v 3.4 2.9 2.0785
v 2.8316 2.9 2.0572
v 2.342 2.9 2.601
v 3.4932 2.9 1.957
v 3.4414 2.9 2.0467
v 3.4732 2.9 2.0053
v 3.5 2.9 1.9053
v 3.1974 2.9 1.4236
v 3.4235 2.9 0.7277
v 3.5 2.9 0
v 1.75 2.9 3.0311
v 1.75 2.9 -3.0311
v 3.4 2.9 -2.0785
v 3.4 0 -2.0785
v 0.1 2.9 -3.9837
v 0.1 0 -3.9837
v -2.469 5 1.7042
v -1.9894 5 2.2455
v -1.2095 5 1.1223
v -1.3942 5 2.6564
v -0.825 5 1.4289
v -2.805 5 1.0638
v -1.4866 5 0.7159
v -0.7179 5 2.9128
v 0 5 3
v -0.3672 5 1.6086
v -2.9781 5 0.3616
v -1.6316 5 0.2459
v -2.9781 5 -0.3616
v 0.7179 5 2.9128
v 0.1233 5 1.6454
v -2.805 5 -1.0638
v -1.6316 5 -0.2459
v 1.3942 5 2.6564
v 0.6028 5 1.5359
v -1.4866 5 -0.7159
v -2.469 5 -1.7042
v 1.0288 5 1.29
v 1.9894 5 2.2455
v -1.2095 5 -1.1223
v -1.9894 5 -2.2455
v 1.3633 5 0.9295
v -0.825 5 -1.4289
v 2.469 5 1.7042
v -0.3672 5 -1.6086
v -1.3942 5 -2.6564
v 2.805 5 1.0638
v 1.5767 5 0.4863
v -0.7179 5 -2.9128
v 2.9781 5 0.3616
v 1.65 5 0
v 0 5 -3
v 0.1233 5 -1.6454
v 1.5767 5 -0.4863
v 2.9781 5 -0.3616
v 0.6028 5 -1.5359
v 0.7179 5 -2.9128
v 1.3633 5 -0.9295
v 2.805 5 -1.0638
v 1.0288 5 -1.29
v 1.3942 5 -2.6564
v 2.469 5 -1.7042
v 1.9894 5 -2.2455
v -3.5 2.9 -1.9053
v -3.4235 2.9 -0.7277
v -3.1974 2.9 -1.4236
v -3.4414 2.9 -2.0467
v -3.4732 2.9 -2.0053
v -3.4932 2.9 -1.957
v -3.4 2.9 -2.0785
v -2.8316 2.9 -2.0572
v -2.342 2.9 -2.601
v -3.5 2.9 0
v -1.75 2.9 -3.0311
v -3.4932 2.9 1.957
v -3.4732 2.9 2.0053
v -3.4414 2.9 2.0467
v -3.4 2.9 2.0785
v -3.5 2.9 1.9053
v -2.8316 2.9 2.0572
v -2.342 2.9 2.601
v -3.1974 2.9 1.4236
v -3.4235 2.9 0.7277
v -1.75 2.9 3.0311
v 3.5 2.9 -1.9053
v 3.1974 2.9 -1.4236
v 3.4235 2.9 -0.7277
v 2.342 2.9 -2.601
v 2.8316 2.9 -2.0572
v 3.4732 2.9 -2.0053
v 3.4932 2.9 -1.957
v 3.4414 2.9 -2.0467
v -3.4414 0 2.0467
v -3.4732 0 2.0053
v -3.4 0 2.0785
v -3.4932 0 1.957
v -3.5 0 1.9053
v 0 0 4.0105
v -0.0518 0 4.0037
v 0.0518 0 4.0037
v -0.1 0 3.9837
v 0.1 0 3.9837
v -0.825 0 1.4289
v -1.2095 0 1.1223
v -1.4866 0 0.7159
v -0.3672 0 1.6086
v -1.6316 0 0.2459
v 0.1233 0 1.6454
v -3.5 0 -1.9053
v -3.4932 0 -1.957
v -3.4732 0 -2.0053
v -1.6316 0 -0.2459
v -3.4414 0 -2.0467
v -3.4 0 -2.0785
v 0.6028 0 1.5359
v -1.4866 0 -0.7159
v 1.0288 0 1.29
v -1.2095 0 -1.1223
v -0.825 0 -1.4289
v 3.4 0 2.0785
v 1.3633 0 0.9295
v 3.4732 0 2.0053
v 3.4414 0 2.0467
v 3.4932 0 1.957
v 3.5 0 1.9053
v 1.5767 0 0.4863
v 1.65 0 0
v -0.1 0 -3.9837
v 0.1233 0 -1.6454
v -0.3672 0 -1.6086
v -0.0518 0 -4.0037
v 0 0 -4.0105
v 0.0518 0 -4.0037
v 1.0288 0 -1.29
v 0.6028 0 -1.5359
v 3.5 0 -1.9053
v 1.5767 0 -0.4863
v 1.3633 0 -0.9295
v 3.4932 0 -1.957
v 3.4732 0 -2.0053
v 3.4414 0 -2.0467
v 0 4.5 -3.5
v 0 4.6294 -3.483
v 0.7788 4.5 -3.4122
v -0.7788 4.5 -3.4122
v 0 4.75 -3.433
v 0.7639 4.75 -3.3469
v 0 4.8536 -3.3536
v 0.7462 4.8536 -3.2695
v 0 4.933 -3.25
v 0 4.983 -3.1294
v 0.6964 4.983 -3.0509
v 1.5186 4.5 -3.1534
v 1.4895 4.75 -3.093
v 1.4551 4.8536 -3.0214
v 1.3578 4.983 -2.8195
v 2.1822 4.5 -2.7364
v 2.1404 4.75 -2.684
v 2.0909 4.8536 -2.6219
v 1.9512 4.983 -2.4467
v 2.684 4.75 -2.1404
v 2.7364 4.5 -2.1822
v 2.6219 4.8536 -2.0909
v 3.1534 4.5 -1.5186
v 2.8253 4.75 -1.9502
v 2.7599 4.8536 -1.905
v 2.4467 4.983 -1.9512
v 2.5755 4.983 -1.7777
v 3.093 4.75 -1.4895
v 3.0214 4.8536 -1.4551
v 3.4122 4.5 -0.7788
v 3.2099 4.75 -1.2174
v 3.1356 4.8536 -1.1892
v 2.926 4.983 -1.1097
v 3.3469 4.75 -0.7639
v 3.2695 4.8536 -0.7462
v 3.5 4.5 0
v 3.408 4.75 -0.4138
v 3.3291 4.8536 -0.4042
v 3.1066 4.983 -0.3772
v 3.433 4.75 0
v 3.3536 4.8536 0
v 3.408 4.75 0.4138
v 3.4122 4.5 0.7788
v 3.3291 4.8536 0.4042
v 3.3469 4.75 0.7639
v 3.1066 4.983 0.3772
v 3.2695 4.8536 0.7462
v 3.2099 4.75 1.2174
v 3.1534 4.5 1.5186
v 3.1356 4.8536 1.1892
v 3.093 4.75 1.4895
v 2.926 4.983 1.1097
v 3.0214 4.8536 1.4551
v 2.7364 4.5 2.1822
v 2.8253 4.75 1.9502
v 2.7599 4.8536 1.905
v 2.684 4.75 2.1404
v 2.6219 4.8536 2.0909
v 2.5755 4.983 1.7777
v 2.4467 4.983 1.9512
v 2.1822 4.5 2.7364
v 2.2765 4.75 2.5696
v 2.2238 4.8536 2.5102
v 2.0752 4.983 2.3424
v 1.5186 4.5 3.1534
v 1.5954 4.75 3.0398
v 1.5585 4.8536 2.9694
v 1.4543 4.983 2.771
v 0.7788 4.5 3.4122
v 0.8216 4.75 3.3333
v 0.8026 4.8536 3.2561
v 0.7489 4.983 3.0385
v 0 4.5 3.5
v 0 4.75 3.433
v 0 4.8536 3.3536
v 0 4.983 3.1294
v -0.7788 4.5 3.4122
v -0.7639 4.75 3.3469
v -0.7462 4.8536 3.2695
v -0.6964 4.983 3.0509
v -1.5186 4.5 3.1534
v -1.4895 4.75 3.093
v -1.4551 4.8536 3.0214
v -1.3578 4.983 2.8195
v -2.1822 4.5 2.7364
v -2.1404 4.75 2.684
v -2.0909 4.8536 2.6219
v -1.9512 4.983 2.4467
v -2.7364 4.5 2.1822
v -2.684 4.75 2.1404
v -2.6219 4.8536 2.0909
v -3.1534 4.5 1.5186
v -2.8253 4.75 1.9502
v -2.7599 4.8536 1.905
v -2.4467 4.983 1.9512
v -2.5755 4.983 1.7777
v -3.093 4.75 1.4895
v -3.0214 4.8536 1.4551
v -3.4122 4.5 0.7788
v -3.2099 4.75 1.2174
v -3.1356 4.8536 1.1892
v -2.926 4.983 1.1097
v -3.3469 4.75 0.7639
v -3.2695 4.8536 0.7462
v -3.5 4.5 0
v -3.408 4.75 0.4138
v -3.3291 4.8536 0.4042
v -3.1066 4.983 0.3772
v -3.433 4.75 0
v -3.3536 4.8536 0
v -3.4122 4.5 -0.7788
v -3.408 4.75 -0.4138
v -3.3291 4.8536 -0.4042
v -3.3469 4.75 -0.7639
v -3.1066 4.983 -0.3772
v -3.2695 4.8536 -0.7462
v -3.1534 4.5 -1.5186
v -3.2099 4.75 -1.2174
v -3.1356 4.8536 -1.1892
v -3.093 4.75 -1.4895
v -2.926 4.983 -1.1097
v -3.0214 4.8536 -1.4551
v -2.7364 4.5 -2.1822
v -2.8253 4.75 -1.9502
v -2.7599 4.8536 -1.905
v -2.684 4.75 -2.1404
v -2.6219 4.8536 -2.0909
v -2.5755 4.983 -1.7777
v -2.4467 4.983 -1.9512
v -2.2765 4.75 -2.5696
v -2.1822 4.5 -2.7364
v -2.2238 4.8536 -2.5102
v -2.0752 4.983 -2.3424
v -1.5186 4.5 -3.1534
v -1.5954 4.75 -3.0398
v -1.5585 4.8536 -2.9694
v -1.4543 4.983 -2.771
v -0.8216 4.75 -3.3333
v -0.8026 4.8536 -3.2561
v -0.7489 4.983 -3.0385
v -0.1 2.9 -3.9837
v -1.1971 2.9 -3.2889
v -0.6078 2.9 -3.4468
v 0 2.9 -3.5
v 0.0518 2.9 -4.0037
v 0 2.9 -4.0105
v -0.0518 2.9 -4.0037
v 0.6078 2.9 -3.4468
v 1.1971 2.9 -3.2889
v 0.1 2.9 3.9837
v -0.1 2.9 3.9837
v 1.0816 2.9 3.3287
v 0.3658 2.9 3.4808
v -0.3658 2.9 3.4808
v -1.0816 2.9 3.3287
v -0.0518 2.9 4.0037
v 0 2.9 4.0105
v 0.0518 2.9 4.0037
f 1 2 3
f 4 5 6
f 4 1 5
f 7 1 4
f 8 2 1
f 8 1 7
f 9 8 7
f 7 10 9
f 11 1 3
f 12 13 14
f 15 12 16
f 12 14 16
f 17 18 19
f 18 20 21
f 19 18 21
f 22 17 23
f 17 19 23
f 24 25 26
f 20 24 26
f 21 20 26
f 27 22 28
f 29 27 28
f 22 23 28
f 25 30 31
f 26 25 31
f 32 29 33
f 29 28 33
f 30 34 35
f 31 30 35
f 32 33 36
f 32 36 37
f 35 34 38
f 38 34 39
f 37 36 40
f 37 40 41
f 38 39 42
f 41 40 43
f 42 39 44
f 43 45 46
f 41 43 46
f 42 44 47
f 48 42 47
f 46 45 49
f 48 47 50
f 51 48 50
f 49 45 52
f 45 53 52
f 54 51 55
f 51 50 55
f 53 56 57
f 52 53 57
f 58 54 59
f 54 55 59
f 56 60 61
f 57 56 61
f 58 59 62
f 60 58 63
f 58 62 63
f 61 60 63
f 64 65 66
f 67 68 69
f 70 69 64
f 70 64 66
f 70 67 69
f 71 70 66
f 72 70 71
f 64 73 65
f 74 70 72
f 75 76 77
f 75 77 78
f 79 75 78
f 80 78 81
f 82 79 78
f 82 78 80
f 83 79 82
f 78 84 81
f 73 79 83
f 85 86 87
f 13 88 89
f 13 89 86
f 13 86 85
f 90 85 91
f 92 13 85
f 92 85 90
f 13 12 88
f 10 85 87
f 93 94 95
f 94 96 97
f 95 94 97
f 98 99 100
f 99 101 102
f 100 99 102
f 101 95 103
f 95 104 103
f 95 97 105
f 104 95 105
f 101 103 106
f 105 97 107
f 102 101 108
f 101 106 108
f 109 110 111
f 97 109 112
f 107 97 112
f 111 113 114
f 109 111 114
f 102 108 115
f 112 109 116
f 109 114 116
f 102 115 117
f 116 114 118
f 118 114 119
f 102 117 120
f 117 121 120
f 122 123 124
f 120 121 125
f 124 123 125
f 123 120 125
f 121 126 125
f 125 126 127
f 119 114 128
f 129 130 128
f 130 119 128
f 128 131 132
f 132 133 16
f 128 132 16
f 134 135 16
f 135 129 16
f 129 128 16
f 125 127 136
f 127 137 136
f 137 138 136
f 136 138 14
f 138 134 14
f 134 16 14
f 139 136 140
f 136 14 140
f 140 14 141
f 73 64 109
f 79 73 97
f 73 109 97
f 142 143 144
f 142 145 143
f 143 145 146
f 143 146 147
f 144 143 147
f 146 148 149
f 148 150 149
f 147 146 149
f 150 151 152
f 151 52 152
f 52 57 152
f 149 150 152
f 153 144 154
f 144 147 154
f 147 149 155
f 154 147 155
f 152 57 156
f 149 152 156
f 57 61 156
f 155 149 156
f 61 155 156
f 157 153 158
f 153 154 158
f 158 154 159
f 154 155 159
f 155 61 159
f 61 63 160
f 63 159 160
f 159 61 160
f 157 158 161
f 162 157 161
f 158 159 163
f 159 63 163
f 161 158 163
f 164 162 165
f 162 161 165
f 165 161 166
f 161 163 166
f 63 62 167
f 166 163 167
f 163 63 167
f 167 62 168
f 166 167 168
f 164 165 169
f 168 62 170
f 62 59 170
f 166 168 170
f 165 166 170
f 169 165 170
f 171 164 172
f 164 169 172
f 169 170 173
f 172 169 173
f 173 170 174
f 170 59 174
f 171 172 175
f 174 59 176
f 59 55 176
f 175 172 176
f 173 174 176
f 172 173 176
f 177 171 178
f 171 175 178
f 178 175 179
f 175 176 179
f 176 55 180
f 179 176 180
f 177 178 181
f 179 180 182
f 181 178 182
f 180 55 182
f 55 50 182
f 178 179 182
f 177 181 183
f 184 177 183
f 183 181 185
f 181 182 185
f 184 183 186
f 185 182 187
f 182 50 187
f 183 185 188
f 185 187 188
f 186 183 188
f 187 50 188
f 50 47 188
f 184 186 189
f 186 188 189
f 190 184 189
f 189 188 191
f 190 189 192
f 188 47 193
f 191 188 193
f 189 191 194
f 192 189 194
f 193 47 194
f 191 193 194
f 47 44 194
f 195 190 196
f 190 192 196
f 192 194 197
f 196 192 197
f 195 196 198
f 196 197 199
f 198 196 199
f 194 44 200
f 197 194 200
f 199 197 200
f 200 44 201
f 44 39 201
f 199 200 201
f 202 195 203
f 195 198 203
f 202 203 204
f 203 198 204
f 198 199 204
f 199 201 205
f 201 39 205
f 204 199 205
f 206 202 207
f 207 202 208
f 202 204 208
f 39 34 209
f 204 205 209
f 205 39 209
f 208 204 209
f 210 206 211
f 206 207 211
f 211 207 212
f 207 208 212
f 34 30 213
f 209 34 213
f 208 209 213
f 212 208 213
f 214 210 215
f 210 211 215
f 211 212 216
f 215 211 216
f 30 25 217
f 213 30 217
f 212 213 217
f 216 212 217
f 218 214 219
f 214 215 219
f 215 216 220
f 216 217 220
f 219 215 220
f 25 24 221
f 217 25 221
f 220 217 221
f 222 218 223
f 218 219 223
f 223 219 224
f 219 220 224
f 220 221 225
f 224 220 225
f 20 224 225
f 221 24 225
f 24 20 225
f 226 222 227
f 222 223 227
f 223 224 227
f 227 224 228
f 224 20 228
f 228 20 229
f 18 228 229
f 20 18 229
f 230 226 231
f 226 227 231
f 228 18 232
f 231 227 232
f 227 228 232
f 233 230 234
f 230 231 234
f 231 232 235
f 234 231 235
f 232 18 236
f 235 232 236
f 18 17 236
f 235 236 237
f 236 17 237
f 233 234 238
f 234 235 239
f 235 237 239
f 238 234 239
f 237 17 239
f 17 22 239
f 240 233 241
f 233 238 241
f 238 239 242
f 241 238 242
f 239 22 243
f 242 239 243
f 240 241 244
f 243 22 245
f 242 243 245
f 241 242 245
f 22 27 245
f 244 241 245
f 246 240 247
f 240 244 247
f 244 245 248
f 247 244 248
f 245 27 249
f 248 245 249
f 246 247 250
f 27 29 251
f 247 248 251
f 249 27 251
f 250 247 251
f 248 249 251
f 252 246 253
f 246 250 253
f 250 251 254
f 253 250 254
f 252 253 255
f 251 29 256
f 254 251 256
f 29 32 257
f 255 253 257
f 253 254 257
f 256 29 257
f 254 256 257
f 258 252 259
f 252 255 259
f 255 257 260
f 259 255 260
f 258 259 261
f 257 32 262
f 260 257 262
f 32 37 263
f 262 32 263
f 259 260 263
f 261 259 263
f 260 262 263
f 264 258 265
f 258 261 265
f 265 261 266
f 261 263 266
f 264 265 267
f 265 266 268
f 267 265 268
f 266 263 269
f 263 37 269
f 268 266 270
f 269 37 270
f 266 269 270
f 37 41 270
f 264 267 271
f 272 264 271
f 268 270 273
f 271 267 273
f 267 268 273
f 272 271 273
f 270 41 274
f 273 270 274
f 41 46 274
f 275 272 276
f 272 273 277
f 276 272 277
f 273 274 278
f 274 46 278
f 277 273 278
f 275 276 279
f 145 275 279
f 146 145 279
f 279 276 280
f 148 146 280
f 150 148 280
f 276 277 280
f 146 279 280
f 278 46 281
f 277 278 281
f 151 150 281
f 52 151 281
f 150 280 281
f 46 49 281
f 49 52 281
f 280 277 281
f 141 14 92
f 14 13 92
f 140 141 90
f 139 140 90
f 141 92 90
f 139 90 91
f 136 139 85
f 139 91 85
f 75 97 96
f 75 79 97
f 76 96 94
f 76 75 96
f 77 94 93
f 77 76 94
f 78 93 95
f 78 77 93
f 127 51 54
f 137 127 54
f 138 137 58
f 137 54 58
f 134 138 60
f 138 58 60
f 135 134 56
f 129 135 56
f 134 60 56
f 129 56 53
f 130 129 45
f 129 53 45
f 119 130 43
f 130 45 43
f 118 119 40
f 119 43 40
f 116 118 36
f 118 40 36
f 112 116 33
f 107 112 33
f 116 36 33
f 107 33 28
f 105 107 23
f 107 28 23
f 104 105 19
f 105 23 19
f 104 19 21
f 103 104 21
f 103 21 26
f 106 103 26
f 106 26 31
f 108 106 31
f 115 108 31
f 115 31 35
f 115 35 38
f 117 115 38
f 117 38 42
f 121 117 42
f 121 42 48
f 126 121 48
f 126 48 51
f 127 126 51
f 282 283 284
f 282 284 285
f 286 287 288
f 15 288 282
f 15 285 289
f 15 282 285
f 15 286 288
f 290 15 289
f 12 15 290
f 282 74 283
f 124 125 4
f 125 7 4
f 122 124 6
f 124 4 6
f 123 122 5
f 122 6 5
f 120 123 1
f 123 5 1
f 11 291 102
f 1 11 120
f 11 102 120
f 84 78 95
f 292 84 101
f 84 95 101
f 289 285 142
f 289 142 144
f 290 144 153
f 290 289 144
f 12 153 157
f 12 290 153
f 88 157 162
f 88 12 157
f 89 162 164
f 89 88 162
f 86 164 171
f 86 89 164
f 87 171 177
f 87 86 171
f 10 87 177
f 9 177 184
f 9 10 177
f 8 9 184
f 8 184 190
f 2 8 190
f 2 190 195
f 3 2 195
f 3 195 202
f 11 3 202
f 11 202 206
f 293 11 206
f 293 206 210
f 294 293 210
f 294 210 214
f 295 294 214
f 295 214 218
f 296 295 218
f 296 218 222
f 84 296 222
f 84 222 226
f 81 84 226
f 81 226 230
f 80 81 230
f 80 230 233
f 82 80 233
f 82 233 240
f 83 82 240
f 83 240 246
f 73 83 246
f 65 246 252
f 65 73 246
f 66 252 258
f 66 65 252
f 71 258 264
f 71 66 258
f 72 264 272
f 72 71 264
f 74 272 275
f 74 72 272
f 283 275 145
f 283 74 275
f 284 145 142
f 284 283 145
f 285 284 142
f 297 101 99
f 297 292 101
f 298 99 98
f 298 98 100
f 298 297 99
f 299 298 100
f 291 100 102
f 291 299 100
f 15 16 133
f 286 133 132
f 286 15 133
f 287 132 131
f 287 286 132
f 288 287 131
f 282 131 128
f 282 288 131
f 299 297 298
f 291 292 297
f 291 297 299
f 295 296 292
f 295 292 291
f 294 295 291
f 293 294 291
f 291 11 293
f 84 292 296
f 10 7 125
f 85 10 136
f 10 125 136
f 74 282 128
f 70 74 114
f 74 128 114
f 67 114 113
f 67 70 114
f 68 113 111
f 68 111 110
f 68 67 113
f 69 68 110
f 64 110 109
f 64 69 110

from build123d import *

# Parameters (mm, degrees)
EXTRUDE_1_DEPTH    = 2.9
SKETCH_2_R         = 3.5
EXTRUDE_2_DEPTH    = 5
FILLET_1_R         = 0.5
FILLET_2_R         = 0.2
HOLE_WIZARD_M4_1_D = 3.3


with BuildPart() as part:
    # 草图1 → 凸台-拉伸1 (new body)
    with BuildSketch(Plane(origin=(0, 0, 0), x_dir=(1, 0, 0), z_dir=(0, 1, 0))):
        Polygon((0, 4.041451884), (-3.5, 2.020725942), (-3.5, -2.020725942), (0, -4.041451884), (3.5, -2.020725942), (3.5, 2.020725942), align=None)
    extrude(amount=EXTRUDE_1_DEPTH)

    # 草图2 → 凸台-拉伸2 (add)
    with BuildSketch(Plane.XZ):
        with Locations(Location((0, 0, 0), (0, 0, 270))):
            Circle(SKETCH_2_R)
    extrude(amount=-EXTRUDE_2_DEPTH)

    # 圆角1
    fillet_1_edges = [part.edges().sort_by_distance(p)[0] for p in [
        (0, 5, 3.5),
    ]]
    fillet(fillet_1_edges, radius=FILLET_1_R)

    # 圆角2
    fillet_2_edges = [part.edges().sort_by_distance(p)[0] for p in [
        (3.5, 1.45, -2.020725942),
        (3.5, 1.45, 2.020725942),
        (0, 1.45, 4.041451884),
        (-3.5, 1.45, 2.020725942),
        (-3.5, 1.45, -2.020725942),
        (0, 1.45, -4.041451884),
    ]]
    fillet(fillet_2_edges, radius=FILLET_2_R)

    # M4 螺纹孔1 (through all)
    with Locations(Plane(origin=(0, 0, 0), x_dir=(-1, 0, 0), z_dir=(0, -1, 0))):
        with Locations((0, 0)):
            Hole(HOLE_WIZARD_M4_1_D / 2)


solid = part.part
